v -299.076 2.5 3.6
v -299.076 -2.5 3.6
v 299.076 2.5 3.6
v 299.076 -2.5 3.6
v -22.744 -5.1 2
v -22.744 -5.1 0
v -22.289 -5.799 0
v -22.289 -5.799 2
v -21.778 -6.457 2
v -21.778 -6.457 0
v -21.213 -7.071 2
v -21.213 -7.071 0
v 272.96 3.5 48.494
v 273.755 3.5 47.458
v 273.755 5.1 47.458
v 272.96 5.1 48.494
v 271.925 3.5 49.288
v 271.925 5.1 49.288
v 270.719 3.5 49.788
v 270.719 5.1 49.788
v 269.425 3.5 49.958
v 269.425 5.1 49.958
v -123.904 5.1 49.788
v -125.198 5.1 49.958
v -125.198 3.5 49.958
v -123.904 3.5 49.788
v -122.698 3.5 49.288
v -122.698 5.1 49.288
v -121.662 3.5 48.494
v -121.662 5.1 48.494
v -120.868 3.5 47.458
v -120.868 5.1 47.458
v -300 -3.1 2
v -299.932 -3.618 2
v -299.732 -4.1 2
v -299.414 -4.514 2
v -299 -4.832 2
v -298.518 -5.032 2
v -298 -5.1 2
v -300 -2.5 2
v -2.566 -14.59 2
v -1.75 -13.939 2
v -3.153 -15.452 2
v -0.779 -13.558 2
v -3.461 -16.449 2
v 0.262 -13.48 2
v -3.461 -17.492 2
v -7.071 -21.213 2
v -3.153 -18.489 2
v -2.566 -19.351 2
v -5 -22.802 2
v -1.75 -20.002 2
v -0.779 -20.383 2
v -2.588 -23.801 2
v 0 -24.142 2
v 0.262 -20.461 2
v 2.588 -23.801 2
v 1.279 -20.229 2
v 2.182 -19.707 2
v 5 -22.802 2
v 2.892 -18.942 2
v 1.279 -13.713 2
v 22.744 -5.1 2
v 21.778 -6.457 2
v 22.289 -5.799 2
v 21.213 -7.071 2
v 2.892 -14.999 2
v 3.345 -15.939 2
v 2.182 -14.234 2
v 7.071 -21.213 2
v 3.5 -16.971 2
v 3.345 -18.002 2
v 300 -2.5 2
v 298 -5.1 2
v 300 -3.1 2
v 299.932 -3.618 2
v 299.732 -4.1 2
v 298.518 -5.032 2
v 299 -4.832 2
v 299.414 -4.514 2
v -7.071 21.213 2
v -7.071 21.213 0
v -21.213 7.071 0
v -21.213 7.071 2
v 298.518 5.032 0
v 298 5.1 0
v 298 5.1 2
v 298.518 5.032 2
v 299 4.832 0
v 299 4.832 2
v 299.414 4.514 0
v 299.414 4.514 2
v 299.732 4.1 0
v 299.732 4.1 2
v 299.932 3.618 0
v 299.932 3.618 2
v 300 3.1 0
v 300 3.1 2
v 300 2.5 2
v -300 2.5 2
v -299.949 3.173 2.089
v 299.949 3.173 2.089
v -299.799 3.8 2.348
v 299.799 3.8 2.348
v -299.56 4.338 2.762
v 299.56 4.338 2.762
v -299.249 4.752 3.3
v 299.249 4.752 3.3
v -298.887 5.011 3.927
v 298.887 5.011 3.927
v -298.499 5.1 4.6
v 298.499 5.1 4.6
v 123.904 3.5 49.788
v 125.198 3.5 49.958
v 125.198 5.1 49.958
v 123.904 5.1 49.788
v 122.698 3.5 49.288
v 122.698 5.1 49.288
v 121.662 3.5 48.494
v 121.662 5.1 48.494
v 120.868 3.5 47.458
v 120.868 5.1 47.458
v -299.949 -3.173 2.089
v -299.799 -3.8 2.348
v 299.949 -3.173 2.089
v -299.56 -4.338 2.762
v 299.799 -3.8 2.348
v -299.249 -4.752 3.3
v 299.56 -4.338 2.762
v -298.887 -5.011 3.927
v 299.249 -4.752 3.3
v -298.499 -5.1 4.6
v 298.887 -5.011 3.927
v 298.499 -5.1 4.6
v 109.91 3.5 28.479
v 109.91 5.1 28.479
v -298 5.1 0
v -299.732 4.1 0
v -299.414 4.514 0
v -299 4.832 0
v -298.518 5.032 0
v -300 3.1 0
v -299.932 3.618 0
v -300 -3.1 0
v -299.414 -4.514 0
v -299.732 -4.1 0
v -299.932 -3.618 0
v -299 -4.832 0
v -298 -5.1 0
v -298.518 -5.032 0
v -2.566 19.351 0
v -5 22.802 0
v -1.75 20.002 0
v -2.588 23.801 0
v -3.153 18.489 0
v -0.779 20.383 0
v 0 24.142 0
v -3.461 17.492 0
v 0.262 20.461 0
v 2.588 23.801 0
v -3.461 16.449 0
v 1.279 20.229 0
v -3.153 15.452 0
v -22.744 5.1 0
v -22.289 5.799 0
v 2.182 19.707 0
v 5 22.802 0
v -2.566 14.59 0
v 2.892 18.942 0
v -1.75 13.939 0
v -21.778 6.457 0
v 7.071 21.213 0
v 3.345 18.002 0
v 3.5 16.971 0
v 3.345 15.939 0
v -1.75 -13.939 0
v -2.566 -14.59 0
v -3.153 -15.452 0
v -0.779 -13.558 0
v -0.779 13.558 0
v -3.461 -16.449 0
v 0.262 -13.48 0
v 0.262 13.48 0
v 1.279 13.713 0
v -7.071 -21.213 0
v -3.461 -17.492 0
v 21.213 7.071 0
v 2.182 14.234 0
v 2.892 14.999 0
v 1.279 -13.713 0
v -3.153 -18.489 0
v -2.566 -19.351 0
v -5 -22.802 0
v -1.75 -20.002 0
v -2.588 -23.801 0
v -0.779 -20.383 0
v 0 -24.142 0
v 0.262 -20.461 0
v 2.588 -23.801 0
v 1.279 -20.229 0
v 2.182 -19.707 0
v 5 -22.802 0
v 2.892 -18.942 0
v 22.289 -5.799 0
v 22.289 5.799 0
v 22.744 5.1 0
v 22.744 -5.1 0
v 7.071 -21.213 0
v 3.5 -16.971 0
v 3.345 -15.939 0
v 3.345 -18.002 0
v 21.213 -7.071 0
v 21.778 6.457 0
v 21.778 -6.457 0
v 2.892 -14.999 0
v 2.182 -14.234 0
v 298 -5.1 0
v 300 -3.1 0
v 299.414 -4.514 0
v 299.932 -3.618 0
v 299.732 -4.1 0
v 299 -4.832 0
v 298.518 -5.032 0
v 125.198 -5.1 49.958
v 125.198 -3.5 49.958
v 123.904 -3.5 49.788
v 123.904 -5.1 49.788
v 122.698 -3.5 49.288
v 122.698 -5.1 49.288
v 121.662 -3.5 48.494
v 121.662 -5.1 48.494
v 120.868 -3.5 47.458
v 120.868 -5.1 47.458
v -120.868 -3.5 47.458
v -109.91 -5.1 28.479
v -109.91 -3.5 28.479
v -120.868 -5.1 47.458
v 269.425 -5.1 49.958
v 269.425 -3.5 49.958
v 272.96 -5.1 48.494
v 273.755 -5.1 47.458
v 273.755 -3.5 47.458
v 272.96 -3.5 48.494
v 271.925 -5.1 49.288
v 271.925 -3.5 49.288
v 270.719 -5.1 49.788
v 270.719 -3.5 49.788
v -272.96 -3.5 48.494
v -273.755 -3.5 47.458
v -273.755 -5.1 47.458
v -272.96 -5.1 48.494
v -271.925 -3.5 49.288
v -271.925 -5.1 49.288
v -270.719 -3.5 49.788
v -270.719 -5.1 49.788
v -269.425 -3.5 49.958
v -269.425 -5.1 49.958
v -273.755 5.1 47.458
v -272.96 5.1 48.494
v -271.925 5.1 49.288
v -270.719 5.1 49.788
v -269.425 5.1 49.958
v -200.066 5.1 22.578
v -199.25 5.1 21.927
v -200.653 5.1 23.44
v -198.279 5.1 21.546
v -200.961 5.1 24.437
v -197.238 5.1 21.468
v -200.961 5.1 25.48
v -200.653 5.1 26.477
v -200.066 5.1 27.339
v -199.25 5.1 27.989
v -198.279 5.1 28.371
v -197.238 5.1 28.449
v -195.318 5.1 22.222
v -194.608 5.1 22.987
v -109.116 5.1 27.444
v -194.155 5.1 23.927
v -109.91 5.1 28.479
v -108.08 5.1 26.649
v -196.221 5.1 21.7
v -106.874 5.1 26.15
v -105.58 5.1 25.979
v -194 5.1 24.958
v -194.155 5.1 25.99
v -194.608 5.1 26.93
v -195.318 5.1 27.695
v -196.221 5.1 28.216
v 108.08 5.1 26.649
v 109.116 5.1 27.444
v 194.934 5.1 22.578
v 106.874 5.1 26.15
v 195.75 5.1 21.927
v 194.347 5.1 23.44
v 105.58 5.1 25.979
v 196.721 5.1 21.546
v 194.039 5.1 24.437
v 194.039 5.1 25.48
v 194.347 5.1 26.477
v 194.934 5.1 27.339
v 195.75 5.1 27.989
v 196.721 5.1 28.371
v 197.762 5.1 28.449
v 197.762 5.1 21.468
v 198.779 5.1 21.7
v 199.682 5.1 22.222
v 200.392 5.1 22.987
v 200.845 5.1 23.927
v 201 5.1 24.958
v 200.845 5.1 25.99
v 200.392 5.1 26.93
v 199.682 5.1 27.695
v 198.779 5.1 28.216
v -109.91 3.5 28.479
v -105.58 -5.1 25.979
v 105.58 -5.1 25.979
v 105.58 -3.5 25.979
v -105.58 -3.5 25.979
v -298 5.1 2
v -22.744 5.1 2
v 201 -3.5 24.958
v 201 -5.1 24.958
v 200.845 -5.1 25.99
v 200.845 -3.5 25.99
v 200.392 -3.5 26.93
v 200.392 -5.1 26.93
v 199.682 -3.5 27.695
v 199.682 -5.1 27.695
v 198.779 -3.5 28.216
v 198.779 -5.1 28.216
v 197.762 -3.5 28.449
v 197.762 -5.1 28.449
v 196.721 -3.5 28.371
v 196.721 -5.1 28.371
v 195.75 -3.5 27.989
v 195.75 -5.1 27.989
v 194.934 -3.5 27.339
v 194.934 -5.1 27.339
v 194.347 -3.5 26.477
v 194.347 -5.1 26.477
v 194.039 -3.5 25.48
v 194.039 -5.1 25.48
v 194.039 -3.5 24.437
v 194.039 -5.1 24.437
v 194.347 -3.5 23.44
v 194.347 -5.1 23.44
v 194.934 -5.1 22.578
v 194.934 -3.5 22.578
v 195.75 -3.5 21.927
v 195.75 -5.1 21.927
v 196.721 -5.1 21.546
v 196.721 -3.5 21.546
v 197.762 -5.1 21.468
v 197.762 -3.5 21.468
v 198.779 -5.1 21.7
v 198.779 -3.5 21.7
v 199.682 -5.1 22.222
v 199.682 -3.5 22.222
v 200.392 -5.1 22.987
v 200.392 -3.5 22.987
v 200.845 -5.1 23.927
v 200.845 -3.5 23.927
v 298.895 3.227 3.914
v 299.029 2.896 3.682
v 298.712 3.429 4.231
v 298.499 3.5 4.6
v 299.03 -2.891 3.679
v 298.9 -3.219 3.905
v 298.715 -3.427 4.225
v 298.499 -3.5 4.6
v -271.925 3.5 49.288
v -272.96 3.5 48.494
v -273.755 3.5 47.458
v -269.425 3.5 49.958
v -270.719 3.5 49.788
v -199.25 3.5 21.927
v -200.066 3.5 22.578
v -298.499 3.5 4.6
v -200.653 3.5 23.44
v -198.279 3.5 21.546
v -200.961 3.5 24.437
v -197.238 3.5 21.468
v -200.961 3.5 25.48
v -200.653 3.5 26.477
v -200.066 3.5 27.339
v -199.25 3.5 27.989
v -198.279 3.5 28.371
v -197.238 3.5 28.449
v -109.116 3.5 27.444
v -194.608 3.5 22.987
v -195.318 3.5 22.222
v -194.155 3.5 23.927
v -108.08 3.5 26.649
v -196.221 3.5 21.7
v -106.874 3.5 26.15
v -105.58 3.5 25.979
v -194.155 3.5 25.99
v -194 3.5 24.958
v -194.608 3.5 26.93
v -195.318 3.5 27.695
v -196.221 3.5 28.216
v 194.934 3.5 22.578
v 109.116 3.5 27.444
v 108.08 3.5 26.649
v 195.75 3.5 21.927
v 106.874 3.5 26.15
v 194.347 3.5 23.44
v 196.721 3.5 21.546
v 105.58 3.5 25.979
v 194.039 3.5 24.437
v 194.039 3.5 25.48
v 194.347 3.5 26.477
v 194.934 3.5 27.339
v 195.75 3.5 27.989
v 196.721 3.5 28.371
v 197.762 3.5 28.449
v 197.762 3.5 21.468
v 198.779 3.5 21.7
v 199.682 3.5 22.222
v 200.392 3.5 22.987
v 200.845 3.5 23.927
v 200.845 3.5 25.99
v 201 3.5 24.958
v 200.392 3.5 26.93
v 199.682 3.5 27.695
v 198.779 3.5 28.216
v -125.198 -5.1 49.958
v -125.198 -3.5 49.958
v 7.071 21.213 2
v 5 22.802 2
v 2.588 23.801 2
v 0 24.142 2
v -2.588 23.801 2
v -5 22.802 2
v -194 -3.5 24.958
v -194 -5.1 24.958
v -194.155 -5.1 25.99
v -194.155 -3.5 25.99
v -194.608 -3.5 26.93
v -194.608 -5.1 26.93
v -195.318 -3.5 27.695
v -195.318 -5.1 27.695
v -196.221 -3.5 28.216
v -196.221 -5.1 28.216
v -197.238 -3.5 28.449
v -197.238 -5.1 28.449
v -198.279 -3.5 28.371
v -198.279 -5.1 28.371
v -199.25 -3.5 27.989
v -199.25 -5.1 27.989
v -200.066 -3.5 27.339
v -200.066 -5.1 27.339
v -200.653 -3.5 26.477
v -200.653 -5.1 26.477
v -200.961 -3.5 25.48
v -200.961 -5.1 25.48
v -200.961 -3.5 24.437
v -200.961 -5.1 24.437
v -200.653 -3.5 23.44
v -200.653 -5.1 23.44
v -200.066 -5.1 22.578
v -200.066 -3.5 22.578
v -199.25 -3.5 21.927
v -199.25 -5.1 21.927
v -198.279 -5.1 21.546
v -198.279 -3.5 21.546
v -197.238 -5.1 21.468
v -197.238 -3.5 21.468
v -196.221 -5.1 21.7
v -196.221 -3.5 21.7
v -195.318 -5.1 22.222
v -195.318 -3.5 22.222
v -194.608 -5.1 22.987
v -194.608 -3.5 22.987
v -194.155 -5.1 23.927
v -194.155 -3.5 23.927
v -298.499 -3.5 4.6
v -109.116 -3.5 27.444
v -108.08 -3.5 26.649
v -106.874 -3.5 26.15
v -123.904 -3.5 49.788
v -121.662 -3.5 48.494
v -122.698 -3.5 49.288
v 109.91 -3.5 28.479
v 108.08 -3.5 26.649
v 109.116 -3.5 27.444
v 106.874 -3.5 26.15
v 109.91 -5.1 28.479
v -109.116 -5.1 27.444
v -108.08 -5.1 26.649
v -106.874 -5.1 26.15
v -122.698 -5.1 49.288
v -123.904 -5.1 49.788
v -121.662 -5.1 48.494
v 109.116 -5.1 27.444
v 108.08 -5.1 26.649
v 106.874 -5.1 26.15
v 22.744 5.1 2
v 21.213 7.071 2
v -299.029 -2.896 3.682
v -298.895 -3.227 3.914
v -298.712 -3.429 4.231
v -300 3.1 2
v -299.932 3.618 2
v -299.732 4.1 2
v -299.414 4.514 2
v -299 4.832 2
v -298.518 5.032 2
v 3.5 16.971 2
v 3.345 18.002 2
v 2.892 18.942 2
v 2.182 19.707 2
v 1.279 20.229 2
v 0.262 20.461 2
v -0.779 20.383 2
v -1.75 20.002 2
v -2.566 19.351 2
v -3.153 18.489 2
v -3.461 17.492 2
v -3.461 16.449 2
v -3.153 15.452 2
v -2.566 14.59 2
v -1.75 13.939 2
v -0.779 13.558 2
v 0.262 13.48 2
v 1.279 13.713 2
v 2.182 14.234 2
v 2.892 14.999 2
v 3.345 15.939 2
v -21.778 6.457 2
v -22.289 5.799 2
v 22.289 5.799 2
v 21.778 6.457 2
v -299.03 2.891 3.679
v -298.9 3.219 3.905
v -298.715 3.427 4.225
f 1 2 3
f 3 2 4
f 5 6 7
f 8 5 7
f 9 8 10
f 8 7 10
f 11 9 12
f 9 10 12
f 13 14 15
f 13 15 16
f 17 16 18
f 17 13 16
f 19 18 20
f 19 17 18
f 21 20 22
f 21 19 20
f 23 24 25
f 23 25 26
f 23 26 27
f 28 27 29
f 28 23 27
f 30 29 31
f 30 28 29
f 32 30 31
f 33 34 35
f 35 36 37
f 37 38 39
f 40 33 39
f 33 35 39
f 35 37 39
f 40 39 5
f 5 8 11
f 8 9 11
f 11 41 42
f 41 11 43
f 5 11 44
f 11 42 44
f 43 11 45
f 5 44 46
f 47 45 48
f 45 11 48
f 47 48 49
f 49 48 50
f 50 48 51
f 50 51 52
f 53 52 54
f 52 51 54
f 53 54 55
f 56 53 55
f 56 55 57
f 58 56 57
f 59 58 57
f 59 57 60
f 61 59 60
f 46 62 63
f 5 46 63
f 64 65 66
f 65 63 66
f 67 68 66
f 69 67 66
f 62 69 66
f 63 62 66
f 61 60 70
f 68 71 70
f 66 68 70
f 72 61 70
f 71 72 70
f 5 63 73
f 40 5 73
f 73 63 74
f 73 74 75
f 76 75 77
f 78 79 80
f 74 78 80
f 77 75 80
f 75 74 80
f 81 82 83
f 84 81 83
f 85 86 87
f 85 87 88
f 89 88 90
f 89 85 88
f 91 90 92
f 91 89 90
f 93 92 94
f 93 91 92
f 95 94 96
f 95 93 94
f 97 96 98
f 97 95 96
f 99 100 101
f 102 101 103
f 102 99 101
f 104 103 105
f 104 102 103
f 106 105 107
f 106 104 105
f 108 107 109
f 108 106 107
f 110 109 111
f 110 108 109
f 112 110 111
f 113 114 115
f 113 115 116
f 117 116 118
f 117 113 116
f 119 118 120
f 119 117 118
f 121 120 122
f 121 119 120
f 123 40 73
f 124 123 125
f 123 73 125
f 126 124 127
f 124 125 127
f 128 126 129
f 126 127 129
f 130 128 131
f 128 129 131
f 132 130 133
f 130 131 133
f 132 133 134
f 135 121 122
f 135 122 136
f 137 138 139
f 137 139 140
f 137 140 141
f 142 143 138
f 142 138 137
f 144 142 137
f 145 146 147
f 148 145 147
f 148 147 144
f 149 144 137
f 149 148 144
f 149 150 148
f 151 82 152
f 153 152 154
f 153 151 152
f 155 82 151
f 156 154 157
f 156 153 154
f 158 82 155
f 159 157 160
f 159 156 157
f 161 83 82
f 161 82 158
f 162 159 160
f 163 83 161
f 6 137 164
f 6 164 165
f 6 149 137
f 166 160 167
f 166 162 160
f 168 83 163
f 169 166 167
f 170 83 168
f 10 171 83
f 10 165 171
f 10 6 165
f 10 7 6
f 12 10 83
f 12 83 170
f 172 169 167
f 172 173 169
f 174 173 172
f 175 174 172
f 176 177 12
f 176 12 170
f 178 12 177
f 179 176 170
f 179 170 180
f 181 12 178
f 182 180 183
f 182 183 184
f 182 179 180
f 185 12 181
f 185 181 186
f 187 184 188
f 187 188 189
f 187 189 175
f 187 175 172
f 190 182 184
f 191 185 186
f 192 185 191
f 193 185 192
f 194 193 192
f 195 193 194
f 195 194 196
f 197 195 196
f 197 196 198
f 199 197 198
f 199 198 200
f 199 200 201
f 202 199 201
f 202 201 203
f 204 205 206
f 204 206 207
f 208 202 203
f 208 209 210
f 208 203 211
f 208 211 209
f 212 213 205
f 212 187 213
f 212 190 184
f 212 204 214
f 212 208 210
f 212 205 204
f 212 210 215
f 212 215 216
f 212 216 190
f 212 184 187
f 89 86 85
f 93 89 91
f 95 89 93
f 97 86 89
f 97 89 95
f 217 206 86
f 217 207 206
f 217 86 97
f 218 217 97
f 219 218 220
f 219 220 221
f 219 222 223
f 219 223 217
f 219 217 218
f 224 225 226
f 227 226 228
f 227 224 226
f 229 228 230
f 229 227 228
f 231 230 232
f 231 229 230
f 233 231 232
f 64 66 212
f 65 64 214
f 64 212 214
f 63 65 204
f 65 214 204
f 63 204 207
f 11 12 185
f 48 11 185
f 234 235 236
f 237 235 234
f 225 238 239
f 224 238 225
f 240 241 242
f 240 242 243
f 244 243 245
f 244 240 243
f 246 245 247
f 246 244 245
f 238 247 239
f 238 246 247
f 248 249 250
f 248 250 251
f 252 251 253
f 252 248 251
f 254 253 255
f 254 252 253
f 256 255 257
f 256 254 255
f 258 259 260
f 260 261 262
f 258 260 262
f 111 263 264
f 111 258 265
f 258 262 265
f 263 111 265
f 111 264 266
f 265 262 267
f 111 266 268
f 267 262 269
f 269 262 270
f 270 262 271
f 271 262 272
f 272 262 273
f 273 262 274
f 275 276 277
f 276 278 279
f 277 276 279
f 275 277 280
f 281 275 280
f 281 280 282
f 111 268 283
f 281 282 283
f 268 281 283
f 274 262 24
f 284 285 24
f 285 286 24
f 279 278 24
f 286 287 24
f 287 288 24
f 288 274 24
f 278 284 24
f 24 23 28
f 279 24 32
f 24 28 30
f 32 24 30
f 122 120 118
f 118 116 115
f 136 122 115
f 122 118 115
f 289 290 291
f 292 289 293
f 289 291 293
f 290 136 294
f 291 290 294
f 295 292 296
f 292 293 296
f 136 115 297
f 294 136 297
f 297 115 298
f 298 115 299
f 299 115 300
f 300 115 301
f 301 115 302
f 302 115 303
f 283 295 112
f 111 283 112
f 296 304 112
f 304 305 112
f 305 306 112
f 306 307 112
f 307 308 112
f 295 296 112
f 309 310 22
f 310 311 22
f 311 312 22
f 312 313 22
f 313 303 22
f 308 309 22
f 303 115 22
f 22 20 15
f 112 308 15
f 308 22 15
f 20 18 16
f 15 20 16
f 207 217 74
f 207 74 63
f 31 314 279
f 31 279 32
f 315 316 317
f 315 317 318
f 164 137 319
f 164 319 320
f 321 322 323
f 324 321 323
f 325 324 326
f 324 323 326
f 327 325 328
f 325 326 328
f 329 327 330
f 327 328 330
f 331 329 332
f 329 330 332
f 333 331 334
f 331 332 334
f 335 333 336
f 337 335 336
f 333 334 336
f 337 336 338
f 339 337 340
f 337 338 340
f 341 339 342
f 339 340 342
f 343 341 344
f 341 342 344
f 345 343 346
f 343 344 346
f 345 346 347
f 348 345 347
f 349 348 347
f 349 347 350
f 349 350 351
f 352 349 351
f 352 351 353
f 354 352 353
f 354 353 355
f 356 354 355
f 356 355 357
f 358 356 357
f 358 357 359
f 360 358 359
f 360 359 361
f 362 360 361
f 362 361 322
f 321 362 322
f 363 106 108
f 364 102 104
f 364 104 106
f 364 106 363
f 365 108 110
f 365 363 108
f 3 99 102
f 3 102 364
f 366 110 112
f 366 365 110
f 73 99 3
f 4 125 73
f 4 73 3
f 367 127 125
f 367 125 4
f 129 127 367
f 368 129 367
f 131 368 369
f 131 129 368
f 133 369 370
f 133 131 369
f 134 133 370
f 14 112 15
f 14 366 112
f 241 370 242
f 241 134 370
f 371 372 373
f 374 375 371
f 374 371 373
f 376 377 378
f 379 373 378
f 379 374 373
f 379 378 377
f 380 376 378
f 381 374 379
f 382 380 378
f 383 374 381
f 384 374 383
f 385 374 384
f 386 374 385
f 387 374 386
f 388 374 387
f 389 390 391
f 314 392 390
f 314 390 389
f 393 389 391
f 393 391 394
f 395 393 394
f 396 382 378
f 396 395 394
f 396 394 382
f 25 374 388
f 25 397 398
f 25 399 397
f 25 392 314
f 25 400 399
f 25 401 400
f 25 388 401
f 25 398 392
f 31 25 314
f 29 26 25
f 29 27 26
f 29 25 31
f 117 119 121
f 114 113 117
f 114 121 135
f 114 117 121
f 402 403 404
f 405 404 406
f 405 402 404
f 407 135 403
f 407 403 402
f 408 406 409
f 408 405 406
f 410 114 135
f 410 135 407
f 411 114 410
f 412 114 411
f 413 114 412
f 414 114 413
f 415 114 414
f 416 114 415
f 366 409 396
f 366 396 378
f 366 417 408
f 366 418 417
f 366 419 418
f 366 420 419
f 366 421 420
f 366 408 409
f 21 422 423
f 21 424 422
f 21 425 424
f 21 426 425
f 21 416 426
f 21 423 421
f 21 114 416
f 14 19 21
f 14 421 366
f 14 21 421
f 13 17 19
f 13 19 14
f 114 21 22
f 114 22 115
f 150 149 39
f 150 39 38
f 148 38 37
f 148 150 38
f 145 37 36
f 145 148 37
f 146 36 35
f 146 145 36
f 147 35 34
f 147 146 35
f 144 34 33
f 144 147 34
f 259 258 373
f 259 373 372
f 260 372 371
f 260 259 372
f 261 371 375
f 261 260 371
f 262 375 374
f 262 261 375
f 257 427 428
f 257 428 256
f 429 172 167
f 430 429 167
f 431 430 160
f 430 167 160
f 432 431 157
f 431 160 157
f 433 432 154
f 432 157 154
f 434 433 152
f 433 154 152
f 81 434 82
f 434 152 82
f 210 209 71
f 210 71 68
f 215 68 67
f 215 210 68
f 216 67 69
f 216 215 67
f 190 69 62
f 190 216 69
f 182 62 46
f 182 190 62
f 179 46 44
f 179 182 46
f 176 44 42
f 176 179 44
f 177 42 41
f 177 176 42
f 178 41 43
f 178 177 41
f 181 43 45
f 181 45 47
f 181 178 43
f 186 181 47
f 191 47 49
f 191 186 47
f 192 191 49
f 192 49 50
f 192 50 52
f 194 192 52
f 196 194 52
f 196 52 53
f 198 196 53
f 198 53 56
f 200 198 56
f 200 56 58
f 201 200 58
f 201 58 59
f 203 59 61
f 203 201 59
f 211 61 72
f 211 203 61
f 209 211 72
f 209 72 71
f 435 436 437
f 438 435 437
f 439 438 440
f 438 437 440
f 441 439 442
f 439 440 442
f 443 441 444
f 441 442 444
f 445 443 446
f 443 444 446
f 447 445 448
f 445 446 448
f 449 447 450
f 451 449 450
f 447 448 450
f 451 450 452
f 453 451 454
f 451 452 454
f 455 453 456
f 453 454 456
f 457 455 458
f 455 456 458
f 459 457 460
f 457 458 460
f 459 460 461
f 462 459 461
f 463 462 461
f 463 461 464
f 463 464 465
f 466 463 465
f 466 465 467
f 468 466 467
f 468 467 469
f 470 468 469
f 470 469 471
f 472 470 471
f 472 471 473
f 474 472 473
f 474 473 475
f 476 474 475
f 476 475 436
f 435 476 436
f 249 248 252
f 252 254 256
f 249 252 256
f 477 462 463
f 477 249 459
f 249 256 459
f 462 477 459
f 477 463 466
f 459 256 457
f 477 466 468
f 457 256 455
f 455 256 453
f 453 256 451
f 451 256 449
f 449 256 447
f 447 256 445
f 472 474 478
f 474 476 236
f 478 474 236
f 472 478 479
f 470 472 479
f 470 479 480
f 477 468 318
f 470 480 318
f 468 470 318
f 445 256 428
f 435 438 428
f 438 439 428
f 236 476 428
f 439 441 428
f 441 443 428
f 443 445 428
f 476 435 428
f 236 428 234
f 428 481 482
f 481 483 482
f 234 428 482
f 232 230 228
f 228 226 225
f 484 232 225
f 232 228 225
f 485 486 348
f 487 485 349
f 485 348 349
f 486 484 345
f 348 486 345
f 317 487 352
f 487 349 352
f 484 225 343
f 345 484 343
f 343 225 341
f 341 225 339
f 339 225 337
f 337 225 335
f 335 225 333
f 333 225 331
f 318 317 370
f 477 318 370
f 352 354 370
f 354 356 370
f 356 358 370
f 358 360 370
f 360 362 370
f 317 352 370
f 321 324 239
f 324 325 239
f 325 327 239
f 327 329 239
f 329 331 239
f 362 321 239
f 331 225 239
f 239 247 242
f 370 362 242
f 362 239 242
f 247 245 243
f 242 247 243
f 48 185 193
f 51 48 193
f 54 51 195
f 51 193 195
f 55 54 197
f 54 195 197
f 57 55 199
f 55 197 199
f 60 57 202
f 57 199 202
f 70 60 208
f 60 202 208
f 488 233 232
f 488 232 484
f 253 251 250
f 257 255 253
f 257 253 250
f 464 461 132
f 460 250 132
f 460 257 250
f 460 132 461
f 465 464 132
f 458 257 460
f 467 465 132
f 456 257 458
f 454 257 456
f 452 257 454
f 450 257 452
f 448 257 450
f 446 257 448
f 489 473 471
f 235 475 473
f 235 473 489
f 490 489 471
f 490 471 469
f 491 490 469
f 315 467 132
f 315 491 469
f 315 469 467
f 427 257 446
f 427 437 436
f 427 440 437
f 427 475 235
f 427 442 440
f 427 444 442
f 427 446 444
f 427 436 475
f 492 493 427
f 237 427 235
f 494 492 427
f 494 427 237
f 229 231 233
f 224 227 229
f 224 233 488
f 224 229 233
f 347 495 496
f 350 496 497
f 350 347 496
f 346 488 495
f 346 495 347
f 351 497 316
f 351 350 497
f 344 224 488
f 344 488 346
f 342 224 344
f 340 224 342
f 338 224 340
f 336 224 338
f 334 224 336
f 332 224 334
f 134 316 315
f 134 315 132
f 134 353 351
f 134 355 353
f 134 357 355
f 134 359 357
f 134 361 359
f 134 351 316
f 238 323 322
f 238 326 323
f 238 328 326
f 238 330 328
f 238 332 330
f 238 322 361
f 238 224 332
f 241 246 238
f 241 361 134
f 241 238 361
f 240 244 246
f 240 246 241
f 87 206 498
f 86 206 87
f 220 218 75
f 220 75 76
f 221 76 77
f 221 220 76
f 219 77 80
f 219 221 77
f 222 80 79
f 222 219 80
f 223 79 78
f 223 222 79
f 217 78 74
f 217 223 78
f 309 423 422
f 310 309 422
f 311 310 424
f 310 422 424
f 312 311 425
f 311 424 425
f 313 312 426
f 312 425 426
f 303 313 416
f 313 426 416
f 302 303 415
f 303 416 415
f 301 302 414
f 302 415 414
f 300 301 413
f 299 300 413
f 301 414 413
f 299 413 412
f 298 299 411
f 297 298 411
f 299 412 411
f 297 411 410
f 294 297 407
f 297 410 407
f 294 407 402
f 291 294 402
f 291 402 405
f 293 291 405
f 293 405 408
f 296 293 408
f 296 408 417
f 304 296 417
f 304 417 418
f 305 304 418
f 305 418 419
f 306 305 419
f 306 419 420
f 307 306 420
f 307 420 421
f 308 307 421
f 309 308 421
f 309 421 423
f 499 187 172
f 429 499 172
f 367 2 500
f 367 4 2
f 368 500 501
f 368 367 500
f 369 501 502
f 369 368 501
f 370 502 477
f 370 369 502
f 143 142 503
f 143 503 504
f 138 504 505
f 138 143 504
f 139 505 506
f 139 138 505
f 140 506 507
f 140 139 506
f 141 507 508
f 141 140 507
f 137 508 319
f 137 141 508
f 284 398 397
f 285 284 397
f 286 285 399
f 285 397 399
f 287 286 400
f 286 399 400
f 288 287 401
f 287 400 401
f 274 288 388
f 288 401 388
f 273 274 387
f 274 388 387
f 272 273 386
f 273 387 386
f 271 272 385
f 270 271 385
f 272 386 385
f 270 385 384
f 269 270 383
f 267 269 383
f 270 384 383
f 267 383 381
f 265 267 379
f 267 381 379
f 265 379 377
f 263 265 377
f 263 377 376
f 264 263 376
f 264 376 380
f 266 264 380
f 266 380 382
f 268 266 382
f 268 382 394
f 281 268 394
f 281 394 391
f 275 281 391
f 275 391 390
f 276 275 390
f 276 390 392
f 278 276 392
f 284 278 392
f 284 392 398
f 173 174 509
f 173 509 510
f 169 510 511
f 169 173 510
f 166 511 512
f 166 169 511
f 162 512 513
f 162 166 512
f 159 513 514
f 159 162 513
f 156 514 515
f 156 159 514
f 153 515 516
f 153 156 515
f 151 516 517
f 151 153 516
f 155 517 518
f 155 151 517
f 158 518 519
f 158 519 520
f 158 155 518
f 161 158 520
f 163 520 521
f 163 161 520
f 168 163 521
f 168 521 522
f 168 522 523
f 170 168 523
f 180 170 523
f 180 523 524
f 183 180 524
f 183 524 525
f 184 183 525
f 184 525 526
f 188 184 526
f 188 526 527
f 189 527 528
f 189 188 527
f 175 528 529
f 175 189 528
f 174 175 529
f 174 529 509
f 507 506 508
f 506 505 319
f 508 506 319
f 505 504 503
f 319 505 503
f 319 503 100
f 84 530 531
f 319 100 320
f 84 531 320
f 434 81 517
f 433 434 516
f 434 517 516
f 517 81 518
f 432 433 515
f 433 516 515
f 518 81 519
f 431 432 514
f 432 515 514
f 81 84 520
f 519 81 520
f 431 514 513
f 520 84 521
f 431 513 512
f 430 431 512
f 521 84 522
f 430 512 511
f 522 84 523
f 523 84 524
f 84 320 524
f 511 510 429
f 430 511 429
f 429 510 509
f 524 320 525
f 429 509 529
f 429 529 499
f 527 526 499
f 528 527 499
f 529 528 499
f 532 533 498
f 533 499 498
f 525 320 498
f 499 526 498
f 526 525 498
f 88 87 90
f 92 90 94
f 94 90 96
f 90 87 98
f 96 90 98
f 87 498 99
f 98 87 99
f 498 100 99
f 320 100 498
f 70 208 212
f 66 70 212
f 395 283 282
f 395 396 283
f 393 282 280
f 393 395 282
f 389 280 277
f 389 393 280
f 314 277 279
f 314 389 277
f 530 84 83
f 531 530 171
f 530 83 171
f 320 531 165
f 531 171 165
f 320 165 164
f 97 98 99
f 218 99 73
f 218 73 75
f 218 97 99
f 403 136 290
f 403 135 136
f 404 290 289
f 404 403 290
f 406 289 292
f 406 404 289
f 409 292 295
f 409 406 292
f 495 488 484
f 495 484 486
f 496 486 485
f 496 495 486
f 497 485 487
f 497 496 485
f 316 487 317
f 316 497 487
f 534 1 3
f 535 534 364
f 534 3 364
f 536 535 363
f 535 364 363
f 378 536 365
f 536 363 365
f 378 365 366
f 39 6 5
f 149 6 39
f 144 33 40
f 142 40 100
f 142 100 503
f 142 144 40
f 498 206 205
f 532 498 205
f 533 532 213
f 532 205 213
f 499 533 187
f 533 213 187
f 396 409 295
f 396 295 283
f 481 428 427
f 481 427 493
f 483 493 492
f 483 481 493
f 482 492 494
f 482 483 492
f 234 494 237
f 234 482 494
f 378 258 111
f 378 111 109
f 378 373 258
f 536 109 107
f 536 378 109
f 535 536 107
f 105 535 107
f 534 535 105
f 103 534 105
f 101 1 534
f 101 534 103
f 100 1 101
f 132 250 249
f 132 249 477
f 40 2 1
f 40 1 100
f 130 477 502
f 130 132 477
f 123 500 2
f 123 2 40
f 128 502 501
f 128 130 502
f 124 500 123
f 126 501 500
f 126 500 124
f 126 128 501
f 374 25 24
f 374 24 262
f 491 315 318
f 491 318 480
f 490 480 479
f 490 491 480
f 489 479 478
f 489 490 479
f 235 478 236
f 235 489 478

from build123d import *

# Parameters (mm, degrees)
F0_R      = 3.5
F1_DEPTH  = 2
F3_DEPTH  = 5.1
F4_R      = 2.6
F5_R      = 5
F6_T      = -1.6
F8_DEPTH  = 2
F9_R      = 3.5
F10_DEPTH = 29.2431356237


with BuildPart() as f1:
    # F0 (on Top) → F1 (new body)
    with BuildSketch(Plane.XY):
        with BuildLine():
            Line((-7.0710678119, 21.2132034356), (-21.2132034356, 7.0710678119))
            ThreePointArc((-21.2132034356, 7.0710678119), (-24.1421356237, 0), (-21.2132034356, -7.0710678119))
            Line((-21.2132034356, -7.0710678119), (-7.0710678119, -21.2132034356))
            ThreePointArc((-7.0710678119, -21.2132034356), (0, -24.1421356237), (7.0710678119, -21.2132034356))
            Line((7.0710678119, -21.2132034356), (21.2132034356, -7.0710678119))
            ThreePointArc((21.2132034356, -7.0710678119), (24.1421356237, 0), (21.2132034356, 7.0710678119))
            Line((21.2132034356, 7.0710678119), (7.0710678119, 21.2132034356))
            ThreePointArc((7.0710678119, 21.2132034356), (0, 24.1421356237), (-7.0710678119, 21.2132034356))
        make_face()
        with Locations((0, -16.9705627485)):
            Circle(F0_R, mode=Mode.SUBTRACT)
        with Locations((-16.9705627485, 0)):
            Circle(F0_R, mode=Mode.SUBTRACT)
        with Locations((16.9705627485, 0)):
            Circle(F0_R, mode=Mode.SUBTRACT)
        with Locations((0, 16.9705627485)):
            Circle(F0_R, mode=Mode.SUBTRACT)
    extrude(amount=F1_DEPTH)



with BuildPart() as f3:
    # F2 (on Front) → F3 (new body, symmetric)
    with BuildSketch(Plane.XZ):
        Polygon((-300, 2), (300, 2), (272.3112537903, 49.9583152331), (122.3112537903, 49.9583152331), (108.4668806854, 25.9791576166), (0, 25.9791576166), (-108.4668806854, 25.9791576166), (-122.3112537903, 49.9583152331), (-272.3112537903, 49.9583152331), align=None)
    extrude(amount=F3_DEPTH, both=True)

    # F4
    f4_edges = [f3.edges().sort_by_distance(p)[0] for p in [
        (0, -5.1, 2),
        (0, 5.1, 2),
    ]]
    fillet(f4_edges, radius=F4_R)

    # F5
    f5_edges = [f3.edges().sort_by_distance(p)[0] for p in [
        (-272.311254, 0, 49.958315),
        (-122.311254, 0, 49.958315),
        (-108.466881, 0, 25.979158),
        (122.311254, 0, 49.958315),
        (108.466881, 0, 25.979158),
        (272.311254, 0, 49.958315),
    ]]
    fillet(f5_edges, radius=F5_R)

    # F6
    f6_openings = [f3.faces().sort_by_distance(p)[0] for p in [
        (-286.796795, 0, 24.868623),
        (-271.924502, 0, 49.288442),
        (-197.311254, 0, 49.958315),
        (0, 0, 25.979158),
        (-108.080129, 0, 26.649031),
        (-115.389067, 0, 37.968736),
        (-122.698005, 0, 49.288442),
        (108.080129, 0, 26.649031),
        (115.389067, 0, 37.968736),
        (122.698005, 0, 49.288442),
        (197.311254, 0, 49.958315),
        (271.924502, 0, 49.288442),
        (286.796795, 0, 24.868623),
    ]]
    offset(amount=F6_T, openings=f6_openings)


with BuildPart() as f1_1:
    add(f1.part)

    add(f3.part)  # F8 merges F3
    # F7 (on face) → F8 (join, through all)
    with BuildSketch(Plane(origin=(0, 0, 0), x_dir=(1, 0, 0), z_dir=(0, 0, -1))):
        with BuildLine():
            Line((-298, -5.1), (298, -5.1))
            ThreePointArc((298, -5.1), (299.4142135624, -4.5142135624), (300, -3.1))
            Line((300, -3.1), (300, 3.1))
            ThreePointArc((300, 3.1), (299.4142135624, 4.5142135624), (298, 5.1))
            Line((298, 5.1), (-298, 5.1))
            ThreePointArc((-298, 5.1), (-299.4142135624, 4.5142135624), (-300, 3.1))
            Line((-300, 3.1), (-300, -3.1))
            ThreePointArc((-300, -3.1), (-299.4142135624, -4.5142135624), (-298, -5.1))
        make_face()
    extrude(amount=-F8_DEPTH)

    # F9 (on face) → F10 (cut, through all)
    with BuildSketch(Plane.XZ.offset(5.1)):
        with Locations((-197.5, 24.9583152331)):
            Circle(F9_R)
        with Locations((197.5, 24.9583152331)):
            Circle(F9_R)
    extrude(amount=-F10_DEPTH, mode=Mode.SUBTRACT)


solid = f1_1.part
